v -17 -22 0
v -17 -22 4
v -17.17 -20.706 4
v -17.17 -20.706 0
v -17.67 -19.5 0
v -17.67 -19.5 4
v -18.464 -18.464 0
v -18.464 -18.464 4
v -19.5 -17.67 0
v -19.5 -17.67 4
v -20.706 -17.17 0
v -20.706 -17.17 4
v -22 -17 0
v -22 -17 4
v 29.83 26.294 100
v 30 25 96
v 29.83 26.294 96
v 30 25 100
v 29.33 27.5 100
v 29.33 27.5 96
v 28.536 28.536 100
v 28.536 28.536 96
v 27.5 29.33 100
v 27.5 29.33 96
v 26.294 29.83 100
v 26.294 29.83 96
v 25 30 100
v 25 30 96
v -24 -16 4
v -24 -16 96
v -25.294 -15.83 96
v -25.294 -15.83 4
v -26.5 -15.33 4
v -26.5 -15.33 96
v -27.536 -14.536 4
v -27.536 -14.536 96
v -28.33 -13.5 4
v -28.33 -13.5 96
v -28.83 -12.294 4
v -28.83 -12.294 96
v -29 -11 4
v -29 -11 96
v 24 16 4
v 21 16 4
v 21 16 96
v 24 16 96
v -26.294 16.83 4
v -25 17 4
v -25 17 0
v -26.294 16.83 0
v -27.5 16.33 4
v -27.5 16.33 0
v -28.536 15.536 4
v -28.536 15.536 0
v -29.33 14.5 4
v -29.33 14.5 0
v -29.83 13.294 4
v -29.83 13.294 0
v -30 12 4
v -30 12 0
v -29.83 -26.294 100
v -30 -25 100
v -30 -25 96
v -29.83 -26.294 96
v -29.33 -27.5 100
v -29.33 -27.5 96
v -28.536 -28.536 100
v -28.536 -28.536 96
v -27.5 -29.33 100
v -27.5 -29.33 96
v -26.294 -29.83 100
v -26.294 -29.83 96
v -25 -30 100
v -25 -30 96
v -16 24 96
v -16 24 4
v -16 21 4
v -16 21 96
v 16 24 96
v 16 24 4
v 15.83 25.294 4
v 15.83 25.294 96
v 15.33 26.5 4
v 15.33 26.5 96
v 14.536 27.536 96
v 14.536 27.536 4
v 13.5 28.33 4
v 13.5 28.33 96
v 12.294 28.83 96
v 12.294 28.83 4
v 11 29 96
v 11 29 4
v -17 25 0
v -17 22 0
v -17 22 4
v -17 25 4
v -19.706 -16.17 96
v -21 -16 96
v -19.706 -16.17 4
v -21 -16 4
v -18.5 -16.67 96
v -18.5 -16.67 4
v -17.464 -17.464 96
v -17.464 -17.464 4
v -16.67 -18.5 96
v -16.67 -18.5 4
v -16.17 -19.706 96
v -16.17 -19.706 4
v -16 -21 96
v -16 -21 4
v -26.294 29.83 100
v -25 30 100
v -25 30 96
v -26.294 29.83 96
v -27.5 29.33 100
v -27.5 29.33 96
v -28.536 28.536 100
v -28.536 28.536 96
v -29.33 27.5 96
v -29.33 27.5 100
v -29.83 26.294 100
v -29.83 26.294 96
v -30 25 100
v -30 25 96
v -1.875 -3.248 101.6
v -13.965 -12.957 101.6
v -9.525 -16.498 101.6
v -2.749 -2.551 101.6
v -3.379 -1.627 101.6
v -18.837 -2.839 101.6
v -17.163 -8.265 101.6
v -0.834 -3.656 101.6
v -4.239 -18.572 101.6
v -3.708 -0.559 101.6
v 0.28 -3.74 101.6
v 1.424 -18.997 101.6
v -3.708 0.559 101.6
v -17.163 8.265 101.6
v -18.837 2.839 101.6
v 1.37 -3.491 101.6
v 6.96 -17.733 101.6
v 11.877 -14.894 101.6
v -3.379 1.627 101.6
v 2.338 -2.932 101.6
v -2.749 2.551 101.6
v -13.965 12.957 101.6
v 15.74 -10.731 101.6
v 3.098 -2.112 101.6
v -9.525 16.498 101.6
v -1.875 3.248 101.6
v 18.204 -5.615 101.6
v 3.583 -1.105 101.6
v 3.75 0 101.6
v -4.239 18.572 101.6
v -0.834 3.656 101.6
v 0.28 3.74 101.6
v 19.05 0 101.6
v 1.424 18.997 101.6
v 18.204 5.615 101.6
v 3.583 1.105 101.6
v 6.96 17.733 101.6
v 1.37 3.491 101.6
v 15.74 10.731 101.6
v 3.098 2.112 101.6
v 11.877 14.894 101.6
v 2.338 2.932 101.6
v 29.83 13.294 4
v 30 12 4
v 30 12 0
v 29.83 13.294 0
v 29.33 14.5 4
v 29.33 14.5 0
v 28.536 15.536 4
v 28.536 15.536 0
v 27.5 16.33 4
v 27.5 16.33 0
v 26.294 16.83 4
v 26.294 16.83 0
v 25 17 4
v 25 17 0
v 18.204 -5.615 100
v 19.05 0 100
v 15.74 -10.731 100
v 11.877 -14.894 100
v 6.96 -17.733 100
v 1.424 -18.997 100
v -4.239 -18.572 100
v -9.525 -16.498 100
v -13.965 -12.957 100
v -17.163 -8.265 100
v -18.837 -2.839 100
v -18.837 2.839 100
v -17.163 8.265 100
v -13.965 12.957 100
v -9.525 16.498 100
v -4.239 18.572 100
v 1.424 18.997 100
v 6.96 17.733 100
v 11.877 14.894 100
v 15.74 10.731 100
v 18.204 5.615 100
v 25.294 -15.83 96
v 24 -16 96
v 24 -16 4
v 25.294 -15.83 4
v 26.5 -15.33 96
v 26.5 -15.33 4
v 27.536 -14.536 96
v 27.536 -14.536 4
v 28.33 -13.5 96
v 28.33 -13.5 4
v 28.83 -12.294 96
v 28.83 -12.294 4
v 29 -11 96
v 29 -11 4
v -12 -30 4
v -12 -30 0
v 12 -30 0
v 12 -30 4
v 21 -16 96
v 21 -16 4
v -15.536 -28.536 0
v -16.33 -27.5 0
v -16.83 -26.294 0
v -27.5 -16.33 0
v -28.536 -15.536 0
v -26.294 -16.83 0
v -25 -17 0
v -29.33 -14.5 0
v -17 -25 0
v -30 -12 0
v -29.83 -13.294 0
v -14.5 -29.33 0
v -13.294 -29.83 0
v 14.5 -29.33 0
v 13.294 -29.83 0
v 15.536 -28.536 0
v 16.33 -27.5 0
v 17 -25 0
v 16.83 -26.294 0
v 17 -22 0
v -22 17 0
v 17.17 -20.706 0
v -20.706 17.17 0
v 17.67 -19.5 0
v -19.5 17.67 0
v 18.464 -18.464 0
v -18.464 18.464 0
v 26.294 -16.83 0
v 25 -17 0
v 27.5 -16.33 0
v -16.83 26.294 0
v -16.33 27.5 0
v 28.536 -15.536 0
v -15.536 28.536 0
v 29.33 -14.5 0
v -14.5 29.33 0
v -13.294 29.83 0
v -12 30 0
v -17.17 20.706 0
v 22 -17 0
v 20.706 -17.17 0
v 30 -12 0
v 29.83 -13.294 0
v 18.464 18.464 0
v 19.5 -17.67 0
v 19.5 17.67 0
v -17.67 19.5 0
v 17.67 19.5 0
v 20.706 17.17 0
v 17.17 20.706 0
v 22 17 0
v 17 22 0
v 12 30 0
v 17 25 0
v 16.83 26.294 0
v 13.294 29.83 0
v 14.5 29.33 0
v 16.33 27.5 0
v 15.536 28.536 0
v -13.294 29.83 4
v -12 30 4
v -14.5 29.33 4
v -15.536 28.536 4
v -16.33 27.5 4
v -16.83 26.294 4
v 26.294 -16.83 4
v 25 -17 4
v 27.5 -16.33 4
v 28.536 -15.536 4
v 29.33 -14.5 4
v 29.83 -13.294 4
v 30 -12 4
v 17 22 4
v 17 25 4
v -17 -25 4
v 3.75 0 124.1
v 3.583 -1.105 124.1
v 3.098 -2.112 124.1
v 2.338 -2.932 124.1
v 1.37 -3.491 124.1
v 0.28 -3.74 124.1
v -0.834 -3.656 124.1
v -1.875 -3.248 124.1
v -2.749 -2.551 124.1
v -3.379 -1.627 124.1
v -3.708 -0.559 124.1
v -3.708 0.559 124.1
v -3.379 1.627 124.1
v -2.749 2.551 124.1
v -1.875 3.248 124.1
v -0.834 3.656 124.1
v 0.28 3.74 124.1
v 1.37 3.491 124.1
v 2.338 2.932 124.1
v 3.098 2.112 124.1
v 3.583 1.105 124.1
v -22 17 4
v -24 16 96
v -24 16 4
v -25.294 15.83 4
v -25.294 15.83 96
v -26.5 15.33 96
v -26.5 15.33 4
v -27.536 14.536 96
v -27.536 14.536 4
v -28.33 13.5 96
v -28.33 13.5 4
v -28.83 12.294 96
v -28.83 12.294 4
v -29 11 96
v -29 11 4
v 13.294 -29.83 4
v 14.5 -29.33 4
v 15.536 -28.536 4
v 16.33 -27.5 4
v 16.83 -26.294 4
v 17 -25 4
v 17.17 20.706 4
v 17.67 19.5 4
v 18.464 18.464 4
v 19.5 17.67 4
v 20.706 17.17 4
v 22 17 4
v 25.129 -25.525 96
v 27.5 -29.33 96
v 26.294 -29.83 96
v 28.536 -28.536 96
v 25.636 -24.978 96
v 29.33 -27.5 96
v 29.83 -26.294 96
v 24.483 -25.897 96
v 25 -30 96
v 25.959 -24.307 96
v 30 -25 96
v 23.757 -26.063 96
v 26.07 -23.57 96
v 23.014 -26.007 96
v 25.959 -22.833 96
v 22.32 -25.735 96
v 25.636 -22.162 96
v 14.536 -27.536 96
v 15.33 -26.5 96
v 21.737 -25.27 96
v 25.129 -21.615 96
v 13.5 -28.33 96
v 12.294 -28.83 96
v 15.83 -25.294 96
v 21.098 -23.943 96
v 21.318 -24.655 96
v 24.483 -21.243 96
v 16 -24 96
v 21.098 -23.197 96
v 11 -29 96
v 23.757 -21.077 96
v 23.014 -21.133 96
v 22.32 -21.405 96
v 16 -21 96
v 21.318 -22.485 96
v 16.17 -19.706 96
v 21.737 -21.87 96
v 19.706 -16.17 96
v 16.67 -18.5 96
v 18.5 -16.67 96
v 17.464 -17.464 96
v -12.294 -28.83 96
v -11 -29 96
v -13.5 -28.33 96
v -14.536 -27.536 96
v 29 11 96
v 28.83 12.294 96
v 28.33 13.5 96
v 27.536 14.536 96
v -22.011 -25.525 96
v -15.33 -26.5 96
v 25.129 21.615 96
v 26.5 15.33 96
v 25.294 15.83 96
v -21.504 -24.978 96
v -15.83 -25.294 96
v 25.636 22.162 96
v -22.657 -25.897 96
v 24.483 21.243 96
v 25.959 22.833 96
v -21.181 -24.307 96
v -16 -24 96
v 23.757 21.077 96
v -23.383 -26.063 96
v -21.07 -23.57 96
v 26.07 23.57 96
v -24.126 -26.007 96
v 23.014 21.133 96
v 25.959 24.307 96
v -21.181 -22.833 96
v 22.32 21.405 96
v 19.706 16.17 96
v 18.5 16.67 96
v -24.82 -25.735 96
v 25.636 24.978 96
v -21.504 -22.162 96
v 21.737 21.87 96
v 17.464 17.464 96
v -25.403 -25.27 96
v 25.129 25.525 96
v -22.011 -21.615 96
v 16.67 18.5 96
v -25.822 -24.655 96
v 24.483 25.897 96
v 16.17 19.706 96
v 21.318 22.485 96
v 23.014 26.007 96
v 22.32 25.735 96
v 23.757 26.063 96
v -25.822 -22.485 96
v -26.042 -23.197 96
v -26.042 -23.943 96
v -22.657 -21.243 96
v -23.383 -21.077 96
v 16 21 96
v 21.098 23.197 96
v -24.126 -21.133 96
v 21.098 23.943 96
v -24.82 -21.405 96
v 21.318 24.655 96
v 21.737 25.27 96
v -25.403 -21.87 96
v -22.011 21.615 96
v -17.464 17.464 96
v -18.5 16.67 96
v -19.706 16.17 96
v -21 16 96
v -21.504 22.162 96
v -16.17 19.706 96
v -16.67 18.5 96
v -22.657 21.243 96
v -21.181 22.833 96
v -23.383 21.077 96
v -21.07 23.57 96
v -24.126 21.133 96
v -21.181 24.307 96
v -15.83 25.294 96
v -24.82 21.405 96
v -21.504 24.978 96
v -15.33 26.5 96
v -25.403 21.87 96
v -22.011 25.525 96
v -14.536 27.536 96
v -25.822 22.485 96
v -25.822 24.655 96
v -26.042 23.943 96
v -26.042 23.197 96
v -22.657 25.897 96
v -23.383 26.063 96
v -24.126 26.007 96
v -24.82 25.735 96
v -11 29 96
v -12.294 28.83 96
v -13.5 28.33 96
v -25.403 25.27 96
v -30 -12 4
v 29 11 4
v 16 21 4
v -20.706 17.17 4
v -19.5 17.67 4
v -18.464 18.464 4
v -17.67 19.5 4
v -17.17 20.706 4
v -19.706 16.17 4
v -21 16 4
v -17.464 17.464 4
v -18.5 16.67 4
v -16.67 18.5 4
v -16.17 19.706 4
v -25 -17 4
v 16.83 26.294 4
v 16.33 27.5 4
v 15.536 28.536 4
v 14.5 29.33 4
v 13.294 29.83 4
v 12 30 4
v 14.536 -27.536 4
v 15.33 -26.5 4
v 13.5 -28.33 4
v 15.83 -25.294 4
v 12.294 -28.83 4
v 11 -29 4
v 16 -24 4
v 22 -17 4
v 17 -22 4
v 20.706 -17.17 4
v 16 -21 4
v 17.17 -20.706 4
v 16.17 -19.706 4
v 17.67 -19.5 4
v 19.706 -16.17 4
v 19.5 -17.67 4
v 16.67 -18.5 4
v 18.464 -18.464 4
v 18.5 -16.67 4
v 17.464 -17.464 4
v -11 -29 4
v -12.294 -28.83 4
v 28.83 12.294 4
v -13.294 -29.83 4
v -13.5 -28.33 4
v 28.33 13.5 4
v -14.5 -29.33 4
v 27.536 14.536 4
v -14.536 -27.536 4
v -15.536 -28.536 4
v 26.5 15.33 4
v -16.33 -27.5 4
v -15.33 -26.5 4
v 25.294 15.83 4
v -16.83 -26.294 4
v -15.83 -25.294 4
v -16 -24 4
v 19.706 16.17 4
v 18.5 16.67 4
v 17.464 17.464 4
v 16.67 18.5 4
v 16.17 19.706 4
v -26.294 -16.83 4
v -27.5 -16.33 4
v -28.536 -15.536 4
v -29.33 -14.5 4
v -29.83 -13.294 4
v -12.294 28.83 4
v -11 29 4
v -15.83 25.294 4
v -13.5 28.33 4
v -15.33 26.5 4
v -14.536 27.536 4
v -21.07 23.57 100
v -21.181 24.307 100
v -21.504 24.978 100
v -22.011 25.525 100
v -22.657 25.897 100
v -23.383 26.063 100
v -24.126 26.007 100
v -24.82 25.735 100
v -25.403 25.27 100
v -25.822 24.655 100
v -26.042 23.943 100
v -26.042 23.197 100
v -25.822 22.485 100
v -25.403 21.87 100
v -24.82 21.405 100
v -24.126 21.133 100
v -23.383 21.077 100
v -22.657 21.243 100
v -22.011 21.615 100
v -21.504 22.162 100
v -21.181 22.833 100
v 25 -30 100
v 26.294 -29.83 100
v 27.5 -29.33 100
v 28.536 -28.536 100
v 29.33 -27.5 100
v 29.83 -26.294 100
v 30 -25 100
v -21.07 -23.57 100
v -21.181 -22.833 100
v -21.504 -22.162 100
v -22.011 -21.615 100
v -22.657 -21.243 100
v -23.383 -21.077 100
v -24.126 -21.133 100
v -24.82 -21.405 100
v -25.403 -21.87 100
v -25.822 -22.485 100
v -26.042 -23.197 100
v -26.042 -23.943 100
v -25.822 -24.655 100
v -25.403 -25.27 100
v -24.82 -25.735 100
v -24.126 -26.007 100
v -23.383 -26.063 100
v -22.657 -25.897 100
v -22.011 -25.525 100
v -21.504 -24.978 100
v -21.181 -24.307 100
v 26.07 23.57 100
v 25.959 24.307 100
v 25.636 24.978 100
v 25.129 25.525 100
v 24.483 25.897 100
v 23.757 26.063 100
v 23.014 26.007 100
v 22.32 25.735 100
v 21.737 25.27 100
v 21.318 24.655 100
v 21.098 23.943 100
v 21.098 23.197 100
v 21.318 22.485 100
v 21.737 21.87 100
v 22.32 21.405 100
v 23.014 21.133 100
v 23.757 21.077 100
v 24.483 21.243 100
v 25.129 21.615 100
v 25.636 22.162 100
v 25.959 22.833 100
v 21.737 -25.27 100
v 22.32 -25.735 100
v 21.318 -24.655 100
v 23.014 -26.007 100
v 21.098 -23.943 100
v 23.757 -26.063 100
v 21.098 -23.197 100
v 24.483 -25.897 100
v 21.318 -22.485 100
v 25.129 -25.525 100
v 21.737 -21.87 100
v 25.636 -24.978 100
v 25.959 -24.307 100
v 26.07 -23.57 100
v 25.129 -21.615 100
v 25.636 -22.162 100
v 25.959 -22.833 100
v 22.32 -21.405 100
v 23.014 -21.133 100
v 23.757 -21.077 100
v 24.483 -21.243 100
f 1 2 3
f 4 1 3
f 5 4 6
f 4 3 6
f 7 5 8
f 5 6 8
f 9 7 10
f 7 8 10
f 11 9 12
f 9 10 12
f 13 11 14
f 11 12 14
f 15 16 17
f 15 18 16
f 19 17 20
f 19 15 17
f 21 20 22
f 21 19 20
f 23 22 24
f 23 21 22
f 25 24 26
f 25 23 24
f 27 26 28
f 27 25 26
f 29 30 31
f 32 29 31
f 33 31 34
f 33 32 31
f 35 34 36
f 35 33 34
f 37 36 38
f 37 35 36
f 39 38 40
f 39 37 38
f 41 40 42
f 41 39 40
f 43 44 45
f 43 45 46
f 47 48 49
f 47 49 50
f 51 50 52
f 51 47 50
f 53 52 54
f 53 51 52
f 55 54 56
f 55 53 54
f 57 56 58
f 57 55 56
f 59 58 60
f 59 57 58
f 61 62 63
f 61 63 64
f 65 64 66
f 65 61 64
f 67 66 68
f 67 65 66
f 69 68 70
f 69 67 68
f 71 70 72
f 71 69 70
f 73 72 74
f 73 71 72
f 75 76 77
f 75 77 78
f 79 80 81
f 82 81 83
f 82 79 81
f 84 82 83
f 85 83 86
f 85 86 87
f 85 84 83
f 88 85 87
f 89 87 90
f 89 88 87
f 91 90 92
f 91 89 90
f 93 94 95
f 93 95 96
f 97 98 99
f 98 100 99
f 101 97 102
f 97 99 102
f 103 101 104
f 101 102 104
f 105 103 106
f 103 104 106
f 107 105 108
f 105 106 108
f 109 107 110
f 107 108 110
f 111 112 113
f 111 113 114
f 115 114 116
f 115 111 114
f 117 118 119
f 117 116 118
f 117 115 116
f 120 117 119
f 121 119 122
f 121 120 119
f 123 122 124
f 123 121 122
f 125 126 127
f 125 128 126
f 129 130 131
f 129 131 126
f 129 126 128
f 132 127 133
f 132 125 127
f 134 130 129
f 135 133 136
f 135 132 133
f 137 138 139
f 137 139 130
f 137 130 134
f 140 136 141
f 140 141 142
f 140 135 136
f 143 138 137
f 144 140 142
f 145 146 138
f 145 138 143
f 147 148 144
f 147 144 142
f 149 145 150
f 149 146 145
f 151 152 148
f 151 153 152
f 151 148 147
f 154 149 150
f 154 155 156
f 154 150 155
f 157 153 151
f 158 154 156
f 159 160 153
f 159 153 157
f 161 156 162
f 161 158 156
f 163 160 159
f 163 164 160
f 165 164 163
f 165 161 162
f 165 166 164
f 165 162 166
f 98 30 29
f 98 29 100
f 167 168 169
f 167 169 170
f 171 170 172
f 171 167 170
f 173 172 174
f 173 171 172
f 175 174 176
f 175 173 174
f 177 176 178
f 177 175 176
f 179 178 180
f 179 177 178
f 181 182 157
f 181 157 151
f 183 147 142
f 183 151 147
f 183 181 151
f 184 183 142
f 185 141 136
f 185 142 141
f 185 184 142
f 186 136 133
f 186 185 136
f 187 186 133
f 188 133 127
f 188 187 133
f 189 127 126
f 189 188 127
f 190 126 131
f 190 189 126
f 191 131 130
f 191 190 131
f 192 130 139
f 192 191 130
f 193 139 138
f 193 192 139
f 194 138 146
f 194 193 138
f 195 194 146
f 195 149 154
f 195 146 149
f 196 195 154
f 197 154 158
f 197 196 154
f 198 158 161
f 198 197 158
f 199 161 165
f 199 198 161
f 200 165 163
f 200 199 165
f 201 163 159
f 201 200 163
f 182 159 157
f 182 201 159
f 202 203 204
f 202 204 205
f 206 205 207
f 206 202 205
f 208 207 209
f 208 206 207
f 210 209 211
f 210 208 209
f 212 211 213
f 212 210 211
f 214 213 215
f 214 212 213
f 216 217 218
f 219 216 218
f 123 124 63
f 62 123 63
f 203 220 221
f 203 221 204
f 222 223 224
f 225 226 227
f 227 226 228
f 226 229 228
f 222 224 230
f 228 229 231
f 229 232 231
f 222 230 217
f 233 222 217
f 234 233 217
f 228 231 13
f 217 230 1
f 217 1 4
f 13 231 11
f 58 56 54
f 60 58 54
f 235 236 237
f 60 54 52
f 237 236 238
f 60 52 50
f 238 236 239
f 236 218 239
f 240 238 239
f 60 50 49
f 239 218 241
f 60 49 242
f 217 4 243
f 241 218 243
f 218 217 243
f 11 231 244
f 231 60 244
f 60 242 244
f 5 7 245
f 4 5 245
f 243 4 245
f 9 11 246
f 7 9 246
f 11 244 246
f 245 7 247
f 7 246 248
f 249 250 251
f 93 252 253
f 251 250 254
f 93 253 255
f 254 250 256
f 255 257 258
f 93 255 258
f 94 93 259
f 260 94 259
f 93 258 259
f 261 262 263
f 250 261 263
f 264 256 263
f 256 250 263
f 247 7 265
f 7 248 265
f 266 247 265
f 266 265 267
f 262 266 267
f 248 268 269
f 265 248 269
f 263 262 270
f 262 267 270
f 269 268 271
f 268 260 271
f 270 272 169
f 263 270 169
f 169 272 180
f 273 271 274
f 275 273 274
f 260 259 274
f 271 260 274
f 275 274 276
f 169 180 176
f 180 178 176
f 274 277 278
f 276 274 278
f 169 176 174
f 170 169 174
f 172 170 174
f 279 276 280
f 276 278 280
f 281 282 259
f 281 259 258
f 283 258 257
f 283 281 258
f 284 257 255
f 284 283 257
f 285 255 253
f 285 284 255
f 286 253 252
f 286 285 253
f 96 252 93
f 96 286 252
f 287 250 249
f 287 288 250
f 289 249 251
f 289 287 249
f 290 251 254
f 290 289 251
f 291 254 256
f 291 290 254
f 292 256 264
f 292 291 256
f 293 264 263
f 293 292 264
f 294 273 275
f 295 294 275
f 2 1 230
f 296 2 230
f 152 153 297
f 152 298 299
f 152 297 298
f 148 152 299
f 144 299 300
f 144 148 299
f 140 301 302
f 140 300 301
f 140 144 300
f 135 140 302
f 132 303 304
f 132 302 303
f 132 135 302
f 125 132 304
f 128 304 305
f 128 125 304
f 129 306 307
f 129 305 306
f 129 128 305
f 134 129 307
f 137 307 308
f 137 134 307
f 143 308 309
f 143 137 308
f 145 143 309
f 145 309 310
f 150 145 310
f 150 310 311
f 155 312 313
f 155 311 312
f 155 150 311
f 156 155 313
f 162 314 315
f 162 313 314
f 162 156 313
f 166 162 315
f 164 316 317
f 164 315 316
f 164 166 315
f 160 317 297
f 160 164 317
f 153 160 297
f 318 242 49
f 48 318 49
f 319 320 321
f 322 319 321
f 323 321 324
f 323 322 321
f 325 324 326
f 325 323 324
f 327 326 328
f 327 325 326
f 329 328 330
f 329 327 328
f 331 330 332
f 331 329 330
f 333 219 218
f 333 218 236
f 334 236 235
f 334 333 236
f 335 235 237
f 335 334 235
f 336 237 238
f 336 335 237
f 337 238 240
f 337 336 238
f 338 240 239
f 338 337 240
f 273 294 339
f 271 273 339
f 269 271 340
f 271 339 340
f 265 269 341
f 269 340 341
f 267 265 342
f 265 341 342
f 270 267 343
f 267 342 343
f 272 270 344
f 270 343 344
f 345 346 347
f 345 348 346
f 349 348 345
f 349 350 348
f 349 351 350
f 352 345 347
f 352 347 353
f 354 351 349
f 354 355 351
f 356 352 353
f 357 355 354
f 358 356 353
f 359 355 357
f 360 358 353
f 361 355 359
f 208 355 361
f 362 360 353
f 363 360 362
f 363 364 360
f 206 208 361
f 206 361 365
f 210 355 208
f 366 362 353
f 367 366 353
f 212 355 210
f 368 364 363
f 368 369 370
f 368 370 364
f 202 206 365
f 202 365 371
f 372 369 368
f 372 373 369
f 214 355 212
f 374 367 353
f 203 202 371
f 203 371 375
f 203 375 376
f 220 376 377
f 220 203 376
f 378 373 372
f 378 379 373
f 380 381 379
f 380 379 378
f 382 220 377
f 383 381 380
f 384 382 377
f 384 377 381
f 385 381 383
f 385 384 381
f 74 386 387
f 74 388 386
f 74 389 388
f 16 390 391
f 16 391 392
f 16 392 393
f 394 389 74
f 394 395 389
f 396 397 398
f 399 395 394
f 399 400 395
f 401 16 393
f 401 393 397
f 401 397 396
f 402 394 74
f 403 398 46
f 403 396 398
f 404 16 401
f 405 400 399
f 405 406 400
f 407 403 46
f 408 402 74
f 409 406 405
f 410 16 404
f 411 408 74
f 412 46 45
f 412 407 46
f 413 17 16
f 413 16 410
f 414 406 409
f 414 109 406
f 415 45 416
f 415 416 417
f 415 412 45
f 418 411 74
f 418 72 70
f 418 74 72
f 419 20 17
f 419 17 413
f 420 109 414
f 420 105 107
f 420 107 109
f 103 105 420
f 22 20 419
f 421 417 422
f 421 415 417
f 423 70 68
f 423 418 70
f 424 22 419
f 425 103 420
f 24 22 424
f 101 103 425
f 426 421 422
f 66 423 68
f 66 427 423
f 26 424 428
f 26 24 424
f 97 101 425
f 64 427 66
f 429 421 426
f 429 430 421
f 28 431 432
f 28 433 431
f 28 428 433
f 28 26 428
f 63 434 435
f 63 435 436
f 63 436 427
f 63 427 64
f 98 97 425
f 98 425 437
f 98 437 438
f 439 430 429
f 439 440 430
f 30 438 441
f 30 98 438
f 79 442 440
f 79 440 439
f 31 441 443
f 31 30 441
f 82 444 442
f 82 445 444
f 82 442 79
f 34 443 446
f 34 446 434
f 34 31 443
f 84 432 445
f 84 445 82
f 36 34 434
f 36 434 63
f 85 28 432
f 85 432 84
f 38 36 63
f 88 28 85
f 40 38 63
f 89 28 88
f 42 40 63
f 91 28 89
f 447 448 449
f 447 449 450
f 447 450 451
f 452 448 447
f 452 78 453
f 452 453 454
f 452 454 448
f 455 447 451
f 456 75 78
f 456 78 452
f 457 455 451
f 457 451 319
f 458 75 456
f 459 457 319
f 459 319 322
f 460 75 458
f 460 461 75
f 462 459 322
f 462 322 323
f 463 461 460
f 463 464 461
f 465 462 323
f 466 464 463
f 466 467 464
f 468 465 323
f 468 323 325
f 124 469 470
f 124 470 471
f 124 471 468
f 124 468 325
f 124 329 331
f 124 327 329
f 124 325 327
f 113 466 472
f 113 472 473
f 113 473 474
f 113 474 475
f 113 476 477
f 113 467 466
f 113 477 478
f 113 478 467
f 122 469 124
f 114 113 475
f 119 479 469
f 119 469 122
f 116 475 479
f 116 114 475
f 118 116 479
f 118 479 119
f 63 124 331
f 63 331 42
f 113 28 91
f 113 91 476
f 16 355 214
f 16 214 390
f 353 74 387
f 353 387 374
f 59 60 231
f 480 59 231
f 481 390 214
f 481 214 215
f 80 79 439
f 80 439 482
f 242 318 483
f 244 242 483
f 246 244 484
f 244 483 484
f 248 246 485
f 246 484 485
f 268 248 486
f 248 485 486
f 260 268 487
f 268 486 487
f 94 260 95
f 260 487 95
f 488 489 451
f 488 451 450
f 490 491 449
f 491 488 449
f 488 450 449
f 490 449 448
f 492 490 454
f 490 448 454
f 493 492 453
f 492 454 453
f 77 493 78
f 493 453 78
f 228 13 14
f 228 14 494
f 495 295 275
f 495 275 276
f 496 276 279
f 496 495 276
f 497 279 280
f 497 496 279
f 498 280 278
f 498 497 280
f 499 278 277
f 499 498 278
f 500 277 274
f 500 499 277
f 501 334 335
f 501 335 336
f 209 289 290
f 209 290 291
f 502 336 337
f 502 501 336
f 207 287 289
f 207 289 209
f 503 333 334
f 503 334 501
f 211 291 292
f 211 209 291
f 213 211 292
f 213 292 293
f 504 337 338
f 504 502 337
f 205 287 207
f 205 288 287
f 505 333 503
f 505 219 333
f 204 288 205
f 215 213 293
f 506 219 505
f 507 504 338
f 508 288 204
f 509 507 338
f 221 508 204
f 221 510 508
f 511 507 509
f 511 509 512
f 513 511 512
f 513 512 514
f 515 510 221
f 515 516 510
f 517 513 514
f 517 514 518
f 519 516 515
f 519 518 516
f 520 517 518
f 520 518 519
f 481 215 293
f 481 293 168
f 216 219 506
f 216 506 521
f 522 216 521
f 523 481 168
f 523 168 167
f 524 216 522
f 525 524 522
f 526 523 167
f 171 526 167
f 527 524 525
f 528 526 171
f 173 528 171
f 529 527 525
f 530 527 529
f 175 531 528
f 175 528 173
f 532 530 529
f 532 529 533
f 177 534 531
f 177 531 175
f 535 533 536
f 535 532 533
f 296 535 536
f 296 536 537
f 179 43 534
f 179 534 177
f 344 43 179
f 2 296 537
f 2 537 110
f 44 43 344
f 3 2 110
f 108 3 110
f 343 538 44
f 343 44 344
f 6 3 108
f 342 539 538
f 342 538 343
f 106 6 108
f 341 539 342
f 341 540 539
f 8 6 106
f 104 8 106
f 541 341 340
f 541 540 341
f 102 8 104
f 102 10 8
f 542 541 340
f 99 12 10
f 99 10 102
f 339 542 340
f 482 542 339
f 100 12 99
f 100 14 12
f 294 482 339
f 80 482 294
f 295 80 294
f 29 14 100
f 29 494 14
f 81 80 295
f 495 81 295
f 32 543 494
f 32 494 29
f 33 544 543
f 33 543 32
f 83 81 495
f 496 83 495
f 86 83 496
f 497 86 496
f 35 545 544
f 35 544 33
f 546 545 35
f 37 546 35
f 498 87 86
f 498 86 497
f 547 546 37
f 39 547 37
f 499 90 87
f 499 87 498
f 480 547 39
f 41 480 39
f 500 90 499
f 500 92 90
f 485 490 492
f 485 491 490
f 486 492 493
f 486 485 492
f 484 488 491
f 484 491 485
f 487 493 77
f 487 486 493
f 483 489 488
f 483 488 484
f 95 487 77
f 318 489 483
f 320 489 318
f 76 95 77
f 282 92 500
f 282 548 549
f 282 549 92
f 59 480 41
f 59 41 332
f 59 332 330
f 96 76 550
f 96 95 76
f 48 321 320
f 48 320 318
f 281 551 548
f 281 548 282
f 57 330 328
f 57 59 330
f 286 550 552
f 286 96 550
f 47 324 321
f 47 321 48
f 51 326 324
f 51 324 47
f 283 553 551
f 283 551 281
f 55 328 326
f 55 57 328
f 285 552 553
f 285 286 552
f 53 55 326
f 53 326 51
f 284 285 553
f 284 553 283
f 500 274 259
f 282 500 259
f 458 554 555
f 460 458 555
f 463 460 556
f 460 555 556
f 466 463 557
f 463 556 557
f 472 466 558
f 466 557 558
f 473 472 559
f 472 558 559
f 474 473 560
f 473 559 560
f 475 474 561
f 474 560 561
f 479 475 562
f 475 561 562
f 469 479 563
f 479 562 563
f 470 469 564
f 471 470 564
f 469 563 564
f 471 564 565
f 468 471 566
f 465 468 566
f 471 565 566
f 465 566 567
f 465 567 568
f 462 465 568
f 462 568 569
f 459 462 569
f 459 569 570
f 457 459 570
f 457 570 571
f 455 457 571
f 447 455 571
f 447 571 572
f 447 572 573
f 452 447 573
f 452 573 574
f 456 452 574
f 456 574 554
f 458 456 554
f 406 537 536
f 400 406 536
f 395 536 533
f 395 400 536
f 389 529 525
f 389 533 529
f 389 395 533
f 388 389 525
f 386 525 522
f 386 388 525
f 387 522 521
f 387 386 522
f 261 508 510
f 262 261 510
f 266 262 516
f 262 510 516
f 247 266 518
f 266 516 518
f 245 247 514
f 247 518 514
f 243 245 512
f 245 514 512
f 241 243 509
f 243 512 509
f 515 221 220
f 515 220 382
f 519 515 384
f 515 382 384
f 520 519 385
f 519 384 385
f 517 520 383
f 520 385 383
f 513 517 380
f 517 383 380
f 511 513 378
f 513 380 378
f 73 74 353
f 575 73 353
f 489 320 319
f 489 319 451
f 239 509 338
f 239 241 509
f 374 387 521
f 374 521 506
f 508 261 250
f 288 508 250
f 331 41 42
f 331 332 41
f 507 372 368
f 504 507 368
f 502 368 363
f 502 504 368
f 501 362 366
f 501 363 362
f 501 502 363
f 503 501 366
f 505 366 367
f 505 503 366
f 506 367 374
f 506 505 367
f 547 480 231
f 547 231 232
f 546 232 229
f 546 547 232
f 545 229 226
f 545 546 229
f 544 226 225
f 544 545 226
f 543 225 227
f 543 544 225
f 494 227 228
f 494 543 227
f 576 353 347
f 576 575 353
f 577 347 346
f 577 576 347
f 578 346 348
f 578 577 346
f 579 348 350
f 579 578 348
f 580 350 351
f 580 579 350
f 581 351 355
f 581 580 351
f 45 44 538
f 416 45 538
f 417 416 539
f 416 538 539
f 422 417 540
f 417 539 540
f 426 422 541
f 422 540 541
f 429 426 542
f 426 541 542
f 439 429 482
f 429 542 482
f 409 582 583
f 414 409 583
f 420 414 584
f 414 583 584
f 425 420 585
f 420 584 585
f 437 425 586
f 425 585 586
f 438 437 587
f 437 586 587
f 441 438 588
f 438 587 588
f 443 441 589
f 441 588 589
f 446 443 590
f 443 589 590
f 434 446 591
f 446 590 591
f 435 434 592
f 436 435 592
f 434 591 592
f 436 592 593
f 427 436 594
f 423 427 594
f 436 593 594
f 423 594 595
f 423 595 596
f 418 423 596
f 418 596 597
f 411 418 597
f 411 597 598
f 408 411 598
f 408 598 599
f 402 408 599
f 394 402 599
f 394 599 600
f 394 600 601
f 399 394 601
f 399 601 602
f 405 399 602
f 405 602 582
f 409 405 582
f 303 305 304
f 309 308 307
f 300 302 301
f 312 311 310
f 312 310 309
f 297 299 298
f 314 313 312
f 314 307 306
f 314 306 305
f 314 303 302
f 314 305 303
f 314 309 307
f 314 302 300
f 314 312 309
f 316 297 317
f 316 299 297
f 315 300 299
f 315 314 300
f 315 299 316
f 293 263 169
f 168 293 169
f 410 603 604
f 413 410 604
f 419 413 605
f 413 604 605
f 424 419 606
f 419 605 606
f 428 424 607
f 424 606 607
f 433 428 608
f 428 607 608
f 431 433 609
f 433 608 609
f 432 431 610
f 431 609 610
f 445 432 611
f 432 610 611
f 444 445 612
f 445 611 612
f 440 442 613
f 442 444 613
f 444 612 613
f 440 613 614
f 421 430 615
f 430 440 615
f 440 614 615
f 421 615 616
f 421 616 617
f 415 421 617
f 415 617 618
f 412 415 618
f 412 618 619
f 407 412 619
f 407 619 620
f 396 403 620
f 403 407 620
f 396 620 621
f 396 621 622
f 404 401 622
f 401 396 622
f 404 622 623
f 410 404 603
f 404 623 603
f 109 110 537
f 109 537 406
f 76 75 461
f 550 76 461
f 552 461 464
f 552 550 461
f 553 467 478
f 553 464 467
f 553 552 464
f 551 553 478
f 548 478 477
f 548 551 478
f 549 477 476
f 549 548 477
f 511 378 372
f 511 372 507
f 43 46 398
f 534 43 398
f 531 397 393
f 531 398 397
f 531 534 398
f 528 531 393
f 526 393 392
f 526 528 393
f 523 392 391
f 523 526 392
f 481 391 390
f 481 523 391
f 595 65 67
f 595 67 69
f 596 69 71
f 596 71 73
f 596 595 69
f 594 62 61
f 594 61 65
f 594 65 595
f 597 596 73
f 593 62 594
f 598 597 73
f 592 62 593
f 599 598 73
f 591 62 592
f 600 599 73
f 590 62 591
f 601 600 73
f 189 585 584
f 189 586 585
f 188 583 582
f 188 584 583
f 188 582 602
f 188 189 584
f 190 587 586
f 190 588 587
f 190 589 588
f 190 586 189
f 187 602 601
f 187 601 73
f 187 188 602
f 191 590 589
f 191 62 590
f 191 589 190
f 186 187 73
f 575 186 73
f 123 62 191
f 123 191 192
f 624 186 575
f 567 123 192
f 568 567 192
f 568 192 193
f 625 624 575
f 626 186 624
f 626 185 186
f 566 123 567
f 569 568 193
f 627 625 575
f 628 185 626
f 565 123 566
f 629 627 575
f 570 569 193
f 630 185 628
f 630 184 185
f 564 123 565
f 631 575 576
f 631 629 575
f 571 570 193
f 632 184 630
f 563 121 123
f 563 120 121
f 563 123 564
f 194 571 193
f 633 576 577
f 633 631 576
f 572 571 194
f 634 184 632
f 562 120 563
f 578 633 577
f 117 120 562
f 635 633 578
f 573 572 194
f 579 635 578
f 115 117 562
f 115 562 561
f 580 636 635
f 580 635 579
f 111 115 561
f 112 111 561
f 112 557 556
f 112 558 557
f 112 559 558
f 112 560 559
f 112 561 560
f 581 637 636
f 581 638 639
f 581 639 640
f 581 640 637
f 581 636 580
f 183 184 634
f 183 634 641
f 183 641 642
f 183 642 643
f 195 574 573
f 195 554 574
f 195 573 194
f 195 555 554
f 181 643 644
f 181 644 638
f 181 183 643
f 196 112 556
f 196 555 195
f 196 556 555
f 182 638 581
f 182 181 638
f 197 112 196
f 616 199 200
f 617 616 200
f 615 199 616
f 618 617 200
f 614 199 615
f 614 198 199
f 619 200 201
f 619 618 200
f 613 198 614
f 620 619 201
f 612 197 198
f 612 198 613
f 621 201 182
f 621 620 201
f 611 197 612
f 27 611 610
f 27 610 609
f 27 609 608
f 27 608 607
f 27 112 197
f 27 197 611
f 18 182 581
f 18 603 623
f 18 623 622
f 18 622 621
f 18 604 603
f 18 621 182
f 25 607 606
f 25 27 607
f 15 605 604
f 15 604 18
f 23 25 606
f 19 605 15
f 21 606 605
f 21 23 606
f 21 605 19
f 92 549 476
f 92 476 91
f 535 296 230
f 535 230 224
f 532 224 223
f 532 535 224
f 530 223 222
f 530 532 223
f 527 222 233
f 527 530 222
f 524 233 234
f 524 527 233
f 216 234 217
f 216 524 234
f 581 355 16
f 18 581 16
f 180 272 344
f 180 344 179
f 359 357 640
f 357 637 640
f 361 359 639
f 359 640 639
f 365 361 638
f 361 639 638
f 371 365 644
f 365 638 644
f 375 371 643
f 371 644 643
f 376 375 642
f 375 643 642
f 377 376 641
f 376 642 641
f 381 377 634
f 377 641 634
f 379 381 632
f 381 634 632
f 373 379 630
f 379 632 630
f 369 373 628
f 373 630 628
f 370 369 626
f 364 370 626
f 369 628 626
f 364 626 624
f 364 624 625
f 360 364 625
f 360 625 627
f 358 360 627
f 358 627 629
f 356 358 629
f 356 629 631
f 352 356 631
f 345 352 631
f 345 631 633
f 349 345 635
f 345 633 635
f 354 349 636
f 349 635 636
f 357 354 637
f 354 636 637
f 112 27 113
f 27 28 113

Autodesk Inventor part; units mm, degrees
ref_plane "YZ Plane" through (0, 0, 0) normal (1, 0, 0) x (0, 1, 0)
ref_plane "XZ Plane" through (0, 0, 0) normal (0, 1, 0) x (-1, 0, 0)
ref_plane "XY Plane" through (0, 0, 0) normal (0, 0, 1) x (1, 0, 0)
sketch "Szkic1" plane through (0, 0, 0) normal (0, 0, 1) x (1, 0, 0)
  line L0 (-30, -30) -> (30, -30)
  line L1 (30, -30) -> (30, 30)
  line L2 (30, 30) -> (-30, 30)
  line L3 (-30, 30) -> (-30, -30)
  line L4 (-30, -30) -> (30, 30) construction
  line L5 (30, -30) -> (-30, 30) construction
  point P0 (0, 0)
  dimension "d0" = 60
  dimension "d1" = 60
extrude "Wyciągnięcie proste1" add sketch "Szkic1" along normal blind 100
sketch "Szkic2" plane through (0, 0, 100) normal (0, 0, 1) x (1, 0, 0)
  circle A0 centre (0, 0) radius 19.05
  dimension "d4" = 38.1
extrude "Wyciągnięcie proste2" add sketch "Szkic2" along normal blind 1.6
sketch "Szkic3" plane through (0, 0, 100) normal (0, 0, 1) x (1, 0, 0)
  line L0 (0, 0) -> (0, 23.57)
  line L1 (30, -30) -> (30, 30) projected
  line L2 (-30, 30) -> (-30, -30) projected
  line L3 (0, 0) -> (0, -23.57)
  line L4 (0, -23.57) -> (23.57, -23.57)
  line L5 (0, -23.57) -> (-23.57, -23.57)
  line L6 (0, 23.57) -> (-23.57, 23.57)
  line L7 (0, 23.57) -> (23.57, 23.57)
  circle A0 centre (23.57, 23.57) radius 2.5
  circle A1 centre (-23.57, 23.57) radius 2.5
  circle A2 centre (-23.57, -23.57) radius 2.5
  circle A3 centre (23.57, -23.57) radius 2.5
  dimension "d13" = 47.14
  dimension "d14" = 47.14
  dimension "d15" = 47.14
  dimension "d16" = 5
  dimension "d17" = 5
  dimension "d18" = 5
  dimension "d19" = 5
extrude "Wyciągnięcie proste3" cut sketch "Szkic3" against normal up to next
sketch "Szkic4" plane through (0, 0, 0) normal (0, 0, -1) x (-1, 0, 0)
  circle A0 centre (23.57, -23.57) radius 2.5 projected
  circle A1 centre (-23.57, 23.57) radius 2.5 projected
  circle A2 centre (23.57, 23.57) radius 2.5 projected
  circle A3 centre (-23.57, -23.57) radius 2.5 projected
  line L0 (30, -30) -> (-30, -30) projected
  line L1 (30, 30) -> (30, -30) projected
  line L2 (-30, 30) -> (30, 30) projected
  line L3 (-30, -30) -> (-30, 30) projected
  line L4 (-30, -30) -> (-30, 30) projected
  line L5 (-17, -17) -> (-17, -30)
  line L6 (17, -17) -> (17, -30)
  line L7 (30, 30) -> (30, -30) projected
  line L8 (-17, -17) -> (-30, -17)
  line L9 (17, 17) -> (30, 17)
  line L10 (-17, 17) -> (-17, 30)
  line L11 (-17, 17) -> (-30, 17)
  line L12 (17, 17) -> (17, 30)
  line L13 (17, -17) -> (30, -17)
  point P0 (0, 0)
extrude "Wyciągnięcie proste4" cut sketch "Szkic4" against normal blind 96 contours L0 L6 L13 L1 | L0 L3 L8 L5 | L9 L12 L2 L1 | L3 L2 L10 L11
sketch "Szkic5" plane through (0, 0, 101.6) normal (0, 0, 1) x (1, 0, 0)
  circle A0 centre (0, 0) radius 3.75
  dimension "d25" = 7.5
extrude "Wyciągnięcie proste5" add sketch "Szkic5" along normal blind 22.5
sketch "Szkic6" plane through (-30, 30, 100) normal (0, 1, 0) x (1, 0, 0)
  line L0 (13, 100) -> (13, 4) projected
  line L1 (13, 4) -> (0, 4) projected
  line L2 (0, 4) -> (0, 0) projected
  line L3 (60, 0) -> (0, 0) projected
  line L4 (60, 4) -> (60, 0) projected
  line L5 (60, 4) -> (47, 4) projected
  line L6 (47, 4) -> (47, 100) projected
  line L7 (47, 100) -> (13, 100) projected
  line L8 (13, 4) -> (47, 4)
  line L9 (13, 100) -> (13, 4) projected
  line L10 (13, 100) -> (13, 96)
  line L11 (13, 96) -> (47, 96)
  point P0 (30, 100)
  dimension "d28" = 4
extrude "Wyciągnięcie proste6" cut sketch "Szkic6" against normal blind 1 contours L11 L6 L8 L0
sketch "Szkic7" plane through (-30, -30, 100) normal (-1, 0, 0) x (0, 0, 1)
  line L0 (-4, 47) -> (-100, 47) projected
  line L1 (-100, 47) -> (-100, 13) projected
  line L2 (-100, 13) -> (-4, 13) projected
  line L3 (-4, 13) -> (-4, 0) projected
  line L4 (-4, 0) -> (0, 0) projected
  line L5 (0, 60) -> (0, 0) projected
  line L6 (-4, 60) -> (0, 60) projected
  line L7 (-4, 60) -> (-4, 47) projected
  line L8 (-100, 47) -> (-4, 47) projected
  line L9 (-100, 13) -> (-4, 13) projected
  line L10 (-4, 47) -> (-4, 13)
  line L11 (-100, 47) -> (-100, 13) projected
  line L12 (-96, 13) -> (-96, 47)
  point P0 (-100, 30)
sketch "Szkic8" plane through (-30, -30, 100) normal (0, -1, 0) x (1, 0, 0)
  line L0 (13, -4) -> (13, -100) projected
  line L1 (13, -100) -> (47, -100) projected
  line L2 (47, -100) -> (47, -4) projected
  line L3 (47, -4) -> (60, -4) projected
  line L4 (60, -4) -> (60, 0) projected
  line L5 (0, 0) -> (60, 0) projected
  line L6 (0, -4) -> (0, 0) projected
  line L7 (0, -4) -> (13, -4) projected
  line L8 (47, -4) -> (13, -4) projected
  line L9 (13, -4) -> (47, -4)
  line L10 (47, -100) -> (47, -96)
  line L11 (47, -100) -> (47, -4) projected
  line L12 (47, -96) -> (13, -96)
  point P0 (30, -100)
  dimension "d34" = 4
sketch "Szkic9" plane through (30, -30, 100) normal (1, 0, 0) x (0, 0, -1)
  line L0 (4, 13) -> (100, 13) projected
  line L1 (100, 13) -> (100, 47) projected
  line L2 (100, 47) -> (4, 47) projected
  line L3 (4, 47) -> (4, 60) projected
  line L4 (4, 60) -> (0, 60) projected
  line L5 (0, 0) -> (0, 60) projected
  line L6 (4, 0) -> (0, 0) projected
  line L7 (4, 0) -> (4, 13) projected
  line L8 (4, 47) -> (4, 13) projected
  line L9 (4, 13) -> (4, 47)
  line L10 (100, 47) -> (100, 60) projected
  line L11 (100, 47) -> (96, 47)
  line L12 (100, 47) -> (4, 47) projected
  line L13 (96, 47) -> (96, 13)
  line L14 (100, 13) -> (4, 13) projected
  point P0 (100, 30)
  dimension "d37" = 4
extrude "Wyciągnięcie proste10" cut sketch "Szkic8" against normal blind 1 contours L8 L2 L12 L0
extrude "Wyciągnięcie proste11" cut sketch "Szkic7" against normal blind 1 contours L10 L2 L12 L0
extrude "Wyciągnięcie proste12" cut sketch "Szkic9" against normal blind 1 contours L8 L2 L13 L0
sketch "Szkic10" plane through (-30, 17, 0) normal (0, 1, 0) x (1, 0, 0)
  line L0 (1, -4) -> (1, -96)
  line L1 (1, -96) -> (13, -96)
  line L2 (13, -4) -> (13, -96)
  line L3 (1, -4) -> (1, -96)
  line L4 (1, -4) -> (13, -4)
  point P0 (30, 0)
extrude "Wyciągnięcie proste13" cut sketch "Szkic10" against normal blind 1
sketch "Szkic11" plane through (-17, 17, 0) normal (-1, 0, 0) x (0, 0, 1)
  line L0 (4, 0) -> (4, -1)
  line L1 (4, -1) -> (96, -1)
  line L2 (96, -1) -> (96, 12)
  line L3 (96, 12) -> (4, 12)
  line L4 (96, 12) -> (4, 12)
  line L5 (4, 12) -> (4, 0)
  point P0 (0, -17)
extrude "Wyciągnięcie proste14" cut sketch "Szkic11" against normal blind 1
sketch "Szkic12" plane through (17, 17, 0) normal (0, 1, 0) x (1, 0, 0)
  line L0 (12, -96) -> (12, -4)
  line L1 (0, -4) -> (0, -96)
  line L2 (0, -96) -> (12, -96)
  line L3 (12, -4) -> (0, -4)
  point P0 (-17, 0)
extrude "Wyciągnięcie proste15" cut sketch "Szkic12" against normal blind 1
sketch "Szkic13" plane through (17, 17, 0) normal (1, 0, 0) x (0, 0, -1)
  line L0 (-4, 12) -> (-96, 12)
  line L1 (-96, 12) -> (-96, -1)
  line L2 (-96, -1) -> (-4, -1)
  line L3 (-4, 0) -> (-4, -1)
  line L4 (-4, -1) -> (-4, 12)
  line L5 (-4, 0) -> (-4, 12)
  point P0 (0, -17)
extrude "Wyciągnięcie proste16" cut sketch "Szkic13" against normal blind 1
sketch "Szkic14" plane through (17, -17, 0) normal (0, -1, 0) x (1, 0, 0)
  line L0 (12, 4) -> (12, 96)
  line L1 (12, 96) -> (0, 96)
  line L2 (0, 4) -> (0, 96)
  line L3 (0, 4) -> (12, 4)
  line L4 (-1, 4) -> (-1, 96)
  point P0 (-17, 0)
extrude "Wyciągnięcie proste17" cut sketch "Szkic14" against normal blind 1
sketch "Szkic15" plane through (17, -30, 0) normal (1, 0, 0) x (0, 0, -1)
  line L0 (-96, 1) -> (-4, 1)
  line L1 (-4, 13) -> (-4, 14)
  line L2 (-4, 14) -> (-96, 14)
  line L3 (-96, 14) -> (-96, 1)
  line L4 (-4, 1) -> (-96, 1)
  line L5 (-4, 1) -> (-4, 13)
  point P0 (0, 30)
extrude "Wyciągnięcie proste18" cut sketch "Szkic15" against normal blind 1
sketch "Szkic16" plane through (-30, -17, 0) normal (0, -1, 0) x (1, 0, 0)
  line L0 (1, 96) -> (1, 4)
  line L1 (13, 4) -> (13, 96)
  line L2 (13, 96) -> (1, 96)
  line L3 (1, 4) -> (14, 4)
  line L4 (13, 4) -> (1, 4)
  point P0 (30, 0)
extrude "Wyciągnięcie proste19" cut sketch "Szkic16" against normal blind 1
sketch "Szkic17" plane through (-17, -30, 0) normal (-1, 0, 0) x (0, 0, 1)
  line L0 (4, 1) -> (96, 1)
  line L1 (96, 1) -> (96, 14)
  line L2 (96, 14) -> (4, 14)
  line L3 (4, 13) -> (4, 14)
  line L4 (4, 14) -> (4, 1)
  line L5 (4, 13) -> (4, 1)
  point P0 (0, 30)
extrude "Wyciągnięcie proste20" cut sketch "Szkic17" against normal blind 1
fillet "Zaokrąglenie1" radius 5 28 edges at (-30, 30, 98) (30, 30, 98) (30, -30, 98) (-30, -30, 98) (-16, -16, 50) (-29, -16, 50) (-16, -29, 50) (16, -29, 50) (16, -16, 50) (29, -16, 50) (29, 16, 50) (16, 16, 50) (16, 29, 50) (-16, 29, 50) (-16, 16, 50) (-29, 16, 50) (-30, 17, 2) (-17, 17, 2) (-17, 30, 2) (17, 30, 2) (17, 17, 2) (30, 17, 2) (30, -17, 2) (17, -17, 2) (17, -30, 2) (-17, -30, 2) (-17, -17, 2) (-30, -17, 2)
properties part number "Silnik krokowy SM 60 100-4004AF - 4Nm"
